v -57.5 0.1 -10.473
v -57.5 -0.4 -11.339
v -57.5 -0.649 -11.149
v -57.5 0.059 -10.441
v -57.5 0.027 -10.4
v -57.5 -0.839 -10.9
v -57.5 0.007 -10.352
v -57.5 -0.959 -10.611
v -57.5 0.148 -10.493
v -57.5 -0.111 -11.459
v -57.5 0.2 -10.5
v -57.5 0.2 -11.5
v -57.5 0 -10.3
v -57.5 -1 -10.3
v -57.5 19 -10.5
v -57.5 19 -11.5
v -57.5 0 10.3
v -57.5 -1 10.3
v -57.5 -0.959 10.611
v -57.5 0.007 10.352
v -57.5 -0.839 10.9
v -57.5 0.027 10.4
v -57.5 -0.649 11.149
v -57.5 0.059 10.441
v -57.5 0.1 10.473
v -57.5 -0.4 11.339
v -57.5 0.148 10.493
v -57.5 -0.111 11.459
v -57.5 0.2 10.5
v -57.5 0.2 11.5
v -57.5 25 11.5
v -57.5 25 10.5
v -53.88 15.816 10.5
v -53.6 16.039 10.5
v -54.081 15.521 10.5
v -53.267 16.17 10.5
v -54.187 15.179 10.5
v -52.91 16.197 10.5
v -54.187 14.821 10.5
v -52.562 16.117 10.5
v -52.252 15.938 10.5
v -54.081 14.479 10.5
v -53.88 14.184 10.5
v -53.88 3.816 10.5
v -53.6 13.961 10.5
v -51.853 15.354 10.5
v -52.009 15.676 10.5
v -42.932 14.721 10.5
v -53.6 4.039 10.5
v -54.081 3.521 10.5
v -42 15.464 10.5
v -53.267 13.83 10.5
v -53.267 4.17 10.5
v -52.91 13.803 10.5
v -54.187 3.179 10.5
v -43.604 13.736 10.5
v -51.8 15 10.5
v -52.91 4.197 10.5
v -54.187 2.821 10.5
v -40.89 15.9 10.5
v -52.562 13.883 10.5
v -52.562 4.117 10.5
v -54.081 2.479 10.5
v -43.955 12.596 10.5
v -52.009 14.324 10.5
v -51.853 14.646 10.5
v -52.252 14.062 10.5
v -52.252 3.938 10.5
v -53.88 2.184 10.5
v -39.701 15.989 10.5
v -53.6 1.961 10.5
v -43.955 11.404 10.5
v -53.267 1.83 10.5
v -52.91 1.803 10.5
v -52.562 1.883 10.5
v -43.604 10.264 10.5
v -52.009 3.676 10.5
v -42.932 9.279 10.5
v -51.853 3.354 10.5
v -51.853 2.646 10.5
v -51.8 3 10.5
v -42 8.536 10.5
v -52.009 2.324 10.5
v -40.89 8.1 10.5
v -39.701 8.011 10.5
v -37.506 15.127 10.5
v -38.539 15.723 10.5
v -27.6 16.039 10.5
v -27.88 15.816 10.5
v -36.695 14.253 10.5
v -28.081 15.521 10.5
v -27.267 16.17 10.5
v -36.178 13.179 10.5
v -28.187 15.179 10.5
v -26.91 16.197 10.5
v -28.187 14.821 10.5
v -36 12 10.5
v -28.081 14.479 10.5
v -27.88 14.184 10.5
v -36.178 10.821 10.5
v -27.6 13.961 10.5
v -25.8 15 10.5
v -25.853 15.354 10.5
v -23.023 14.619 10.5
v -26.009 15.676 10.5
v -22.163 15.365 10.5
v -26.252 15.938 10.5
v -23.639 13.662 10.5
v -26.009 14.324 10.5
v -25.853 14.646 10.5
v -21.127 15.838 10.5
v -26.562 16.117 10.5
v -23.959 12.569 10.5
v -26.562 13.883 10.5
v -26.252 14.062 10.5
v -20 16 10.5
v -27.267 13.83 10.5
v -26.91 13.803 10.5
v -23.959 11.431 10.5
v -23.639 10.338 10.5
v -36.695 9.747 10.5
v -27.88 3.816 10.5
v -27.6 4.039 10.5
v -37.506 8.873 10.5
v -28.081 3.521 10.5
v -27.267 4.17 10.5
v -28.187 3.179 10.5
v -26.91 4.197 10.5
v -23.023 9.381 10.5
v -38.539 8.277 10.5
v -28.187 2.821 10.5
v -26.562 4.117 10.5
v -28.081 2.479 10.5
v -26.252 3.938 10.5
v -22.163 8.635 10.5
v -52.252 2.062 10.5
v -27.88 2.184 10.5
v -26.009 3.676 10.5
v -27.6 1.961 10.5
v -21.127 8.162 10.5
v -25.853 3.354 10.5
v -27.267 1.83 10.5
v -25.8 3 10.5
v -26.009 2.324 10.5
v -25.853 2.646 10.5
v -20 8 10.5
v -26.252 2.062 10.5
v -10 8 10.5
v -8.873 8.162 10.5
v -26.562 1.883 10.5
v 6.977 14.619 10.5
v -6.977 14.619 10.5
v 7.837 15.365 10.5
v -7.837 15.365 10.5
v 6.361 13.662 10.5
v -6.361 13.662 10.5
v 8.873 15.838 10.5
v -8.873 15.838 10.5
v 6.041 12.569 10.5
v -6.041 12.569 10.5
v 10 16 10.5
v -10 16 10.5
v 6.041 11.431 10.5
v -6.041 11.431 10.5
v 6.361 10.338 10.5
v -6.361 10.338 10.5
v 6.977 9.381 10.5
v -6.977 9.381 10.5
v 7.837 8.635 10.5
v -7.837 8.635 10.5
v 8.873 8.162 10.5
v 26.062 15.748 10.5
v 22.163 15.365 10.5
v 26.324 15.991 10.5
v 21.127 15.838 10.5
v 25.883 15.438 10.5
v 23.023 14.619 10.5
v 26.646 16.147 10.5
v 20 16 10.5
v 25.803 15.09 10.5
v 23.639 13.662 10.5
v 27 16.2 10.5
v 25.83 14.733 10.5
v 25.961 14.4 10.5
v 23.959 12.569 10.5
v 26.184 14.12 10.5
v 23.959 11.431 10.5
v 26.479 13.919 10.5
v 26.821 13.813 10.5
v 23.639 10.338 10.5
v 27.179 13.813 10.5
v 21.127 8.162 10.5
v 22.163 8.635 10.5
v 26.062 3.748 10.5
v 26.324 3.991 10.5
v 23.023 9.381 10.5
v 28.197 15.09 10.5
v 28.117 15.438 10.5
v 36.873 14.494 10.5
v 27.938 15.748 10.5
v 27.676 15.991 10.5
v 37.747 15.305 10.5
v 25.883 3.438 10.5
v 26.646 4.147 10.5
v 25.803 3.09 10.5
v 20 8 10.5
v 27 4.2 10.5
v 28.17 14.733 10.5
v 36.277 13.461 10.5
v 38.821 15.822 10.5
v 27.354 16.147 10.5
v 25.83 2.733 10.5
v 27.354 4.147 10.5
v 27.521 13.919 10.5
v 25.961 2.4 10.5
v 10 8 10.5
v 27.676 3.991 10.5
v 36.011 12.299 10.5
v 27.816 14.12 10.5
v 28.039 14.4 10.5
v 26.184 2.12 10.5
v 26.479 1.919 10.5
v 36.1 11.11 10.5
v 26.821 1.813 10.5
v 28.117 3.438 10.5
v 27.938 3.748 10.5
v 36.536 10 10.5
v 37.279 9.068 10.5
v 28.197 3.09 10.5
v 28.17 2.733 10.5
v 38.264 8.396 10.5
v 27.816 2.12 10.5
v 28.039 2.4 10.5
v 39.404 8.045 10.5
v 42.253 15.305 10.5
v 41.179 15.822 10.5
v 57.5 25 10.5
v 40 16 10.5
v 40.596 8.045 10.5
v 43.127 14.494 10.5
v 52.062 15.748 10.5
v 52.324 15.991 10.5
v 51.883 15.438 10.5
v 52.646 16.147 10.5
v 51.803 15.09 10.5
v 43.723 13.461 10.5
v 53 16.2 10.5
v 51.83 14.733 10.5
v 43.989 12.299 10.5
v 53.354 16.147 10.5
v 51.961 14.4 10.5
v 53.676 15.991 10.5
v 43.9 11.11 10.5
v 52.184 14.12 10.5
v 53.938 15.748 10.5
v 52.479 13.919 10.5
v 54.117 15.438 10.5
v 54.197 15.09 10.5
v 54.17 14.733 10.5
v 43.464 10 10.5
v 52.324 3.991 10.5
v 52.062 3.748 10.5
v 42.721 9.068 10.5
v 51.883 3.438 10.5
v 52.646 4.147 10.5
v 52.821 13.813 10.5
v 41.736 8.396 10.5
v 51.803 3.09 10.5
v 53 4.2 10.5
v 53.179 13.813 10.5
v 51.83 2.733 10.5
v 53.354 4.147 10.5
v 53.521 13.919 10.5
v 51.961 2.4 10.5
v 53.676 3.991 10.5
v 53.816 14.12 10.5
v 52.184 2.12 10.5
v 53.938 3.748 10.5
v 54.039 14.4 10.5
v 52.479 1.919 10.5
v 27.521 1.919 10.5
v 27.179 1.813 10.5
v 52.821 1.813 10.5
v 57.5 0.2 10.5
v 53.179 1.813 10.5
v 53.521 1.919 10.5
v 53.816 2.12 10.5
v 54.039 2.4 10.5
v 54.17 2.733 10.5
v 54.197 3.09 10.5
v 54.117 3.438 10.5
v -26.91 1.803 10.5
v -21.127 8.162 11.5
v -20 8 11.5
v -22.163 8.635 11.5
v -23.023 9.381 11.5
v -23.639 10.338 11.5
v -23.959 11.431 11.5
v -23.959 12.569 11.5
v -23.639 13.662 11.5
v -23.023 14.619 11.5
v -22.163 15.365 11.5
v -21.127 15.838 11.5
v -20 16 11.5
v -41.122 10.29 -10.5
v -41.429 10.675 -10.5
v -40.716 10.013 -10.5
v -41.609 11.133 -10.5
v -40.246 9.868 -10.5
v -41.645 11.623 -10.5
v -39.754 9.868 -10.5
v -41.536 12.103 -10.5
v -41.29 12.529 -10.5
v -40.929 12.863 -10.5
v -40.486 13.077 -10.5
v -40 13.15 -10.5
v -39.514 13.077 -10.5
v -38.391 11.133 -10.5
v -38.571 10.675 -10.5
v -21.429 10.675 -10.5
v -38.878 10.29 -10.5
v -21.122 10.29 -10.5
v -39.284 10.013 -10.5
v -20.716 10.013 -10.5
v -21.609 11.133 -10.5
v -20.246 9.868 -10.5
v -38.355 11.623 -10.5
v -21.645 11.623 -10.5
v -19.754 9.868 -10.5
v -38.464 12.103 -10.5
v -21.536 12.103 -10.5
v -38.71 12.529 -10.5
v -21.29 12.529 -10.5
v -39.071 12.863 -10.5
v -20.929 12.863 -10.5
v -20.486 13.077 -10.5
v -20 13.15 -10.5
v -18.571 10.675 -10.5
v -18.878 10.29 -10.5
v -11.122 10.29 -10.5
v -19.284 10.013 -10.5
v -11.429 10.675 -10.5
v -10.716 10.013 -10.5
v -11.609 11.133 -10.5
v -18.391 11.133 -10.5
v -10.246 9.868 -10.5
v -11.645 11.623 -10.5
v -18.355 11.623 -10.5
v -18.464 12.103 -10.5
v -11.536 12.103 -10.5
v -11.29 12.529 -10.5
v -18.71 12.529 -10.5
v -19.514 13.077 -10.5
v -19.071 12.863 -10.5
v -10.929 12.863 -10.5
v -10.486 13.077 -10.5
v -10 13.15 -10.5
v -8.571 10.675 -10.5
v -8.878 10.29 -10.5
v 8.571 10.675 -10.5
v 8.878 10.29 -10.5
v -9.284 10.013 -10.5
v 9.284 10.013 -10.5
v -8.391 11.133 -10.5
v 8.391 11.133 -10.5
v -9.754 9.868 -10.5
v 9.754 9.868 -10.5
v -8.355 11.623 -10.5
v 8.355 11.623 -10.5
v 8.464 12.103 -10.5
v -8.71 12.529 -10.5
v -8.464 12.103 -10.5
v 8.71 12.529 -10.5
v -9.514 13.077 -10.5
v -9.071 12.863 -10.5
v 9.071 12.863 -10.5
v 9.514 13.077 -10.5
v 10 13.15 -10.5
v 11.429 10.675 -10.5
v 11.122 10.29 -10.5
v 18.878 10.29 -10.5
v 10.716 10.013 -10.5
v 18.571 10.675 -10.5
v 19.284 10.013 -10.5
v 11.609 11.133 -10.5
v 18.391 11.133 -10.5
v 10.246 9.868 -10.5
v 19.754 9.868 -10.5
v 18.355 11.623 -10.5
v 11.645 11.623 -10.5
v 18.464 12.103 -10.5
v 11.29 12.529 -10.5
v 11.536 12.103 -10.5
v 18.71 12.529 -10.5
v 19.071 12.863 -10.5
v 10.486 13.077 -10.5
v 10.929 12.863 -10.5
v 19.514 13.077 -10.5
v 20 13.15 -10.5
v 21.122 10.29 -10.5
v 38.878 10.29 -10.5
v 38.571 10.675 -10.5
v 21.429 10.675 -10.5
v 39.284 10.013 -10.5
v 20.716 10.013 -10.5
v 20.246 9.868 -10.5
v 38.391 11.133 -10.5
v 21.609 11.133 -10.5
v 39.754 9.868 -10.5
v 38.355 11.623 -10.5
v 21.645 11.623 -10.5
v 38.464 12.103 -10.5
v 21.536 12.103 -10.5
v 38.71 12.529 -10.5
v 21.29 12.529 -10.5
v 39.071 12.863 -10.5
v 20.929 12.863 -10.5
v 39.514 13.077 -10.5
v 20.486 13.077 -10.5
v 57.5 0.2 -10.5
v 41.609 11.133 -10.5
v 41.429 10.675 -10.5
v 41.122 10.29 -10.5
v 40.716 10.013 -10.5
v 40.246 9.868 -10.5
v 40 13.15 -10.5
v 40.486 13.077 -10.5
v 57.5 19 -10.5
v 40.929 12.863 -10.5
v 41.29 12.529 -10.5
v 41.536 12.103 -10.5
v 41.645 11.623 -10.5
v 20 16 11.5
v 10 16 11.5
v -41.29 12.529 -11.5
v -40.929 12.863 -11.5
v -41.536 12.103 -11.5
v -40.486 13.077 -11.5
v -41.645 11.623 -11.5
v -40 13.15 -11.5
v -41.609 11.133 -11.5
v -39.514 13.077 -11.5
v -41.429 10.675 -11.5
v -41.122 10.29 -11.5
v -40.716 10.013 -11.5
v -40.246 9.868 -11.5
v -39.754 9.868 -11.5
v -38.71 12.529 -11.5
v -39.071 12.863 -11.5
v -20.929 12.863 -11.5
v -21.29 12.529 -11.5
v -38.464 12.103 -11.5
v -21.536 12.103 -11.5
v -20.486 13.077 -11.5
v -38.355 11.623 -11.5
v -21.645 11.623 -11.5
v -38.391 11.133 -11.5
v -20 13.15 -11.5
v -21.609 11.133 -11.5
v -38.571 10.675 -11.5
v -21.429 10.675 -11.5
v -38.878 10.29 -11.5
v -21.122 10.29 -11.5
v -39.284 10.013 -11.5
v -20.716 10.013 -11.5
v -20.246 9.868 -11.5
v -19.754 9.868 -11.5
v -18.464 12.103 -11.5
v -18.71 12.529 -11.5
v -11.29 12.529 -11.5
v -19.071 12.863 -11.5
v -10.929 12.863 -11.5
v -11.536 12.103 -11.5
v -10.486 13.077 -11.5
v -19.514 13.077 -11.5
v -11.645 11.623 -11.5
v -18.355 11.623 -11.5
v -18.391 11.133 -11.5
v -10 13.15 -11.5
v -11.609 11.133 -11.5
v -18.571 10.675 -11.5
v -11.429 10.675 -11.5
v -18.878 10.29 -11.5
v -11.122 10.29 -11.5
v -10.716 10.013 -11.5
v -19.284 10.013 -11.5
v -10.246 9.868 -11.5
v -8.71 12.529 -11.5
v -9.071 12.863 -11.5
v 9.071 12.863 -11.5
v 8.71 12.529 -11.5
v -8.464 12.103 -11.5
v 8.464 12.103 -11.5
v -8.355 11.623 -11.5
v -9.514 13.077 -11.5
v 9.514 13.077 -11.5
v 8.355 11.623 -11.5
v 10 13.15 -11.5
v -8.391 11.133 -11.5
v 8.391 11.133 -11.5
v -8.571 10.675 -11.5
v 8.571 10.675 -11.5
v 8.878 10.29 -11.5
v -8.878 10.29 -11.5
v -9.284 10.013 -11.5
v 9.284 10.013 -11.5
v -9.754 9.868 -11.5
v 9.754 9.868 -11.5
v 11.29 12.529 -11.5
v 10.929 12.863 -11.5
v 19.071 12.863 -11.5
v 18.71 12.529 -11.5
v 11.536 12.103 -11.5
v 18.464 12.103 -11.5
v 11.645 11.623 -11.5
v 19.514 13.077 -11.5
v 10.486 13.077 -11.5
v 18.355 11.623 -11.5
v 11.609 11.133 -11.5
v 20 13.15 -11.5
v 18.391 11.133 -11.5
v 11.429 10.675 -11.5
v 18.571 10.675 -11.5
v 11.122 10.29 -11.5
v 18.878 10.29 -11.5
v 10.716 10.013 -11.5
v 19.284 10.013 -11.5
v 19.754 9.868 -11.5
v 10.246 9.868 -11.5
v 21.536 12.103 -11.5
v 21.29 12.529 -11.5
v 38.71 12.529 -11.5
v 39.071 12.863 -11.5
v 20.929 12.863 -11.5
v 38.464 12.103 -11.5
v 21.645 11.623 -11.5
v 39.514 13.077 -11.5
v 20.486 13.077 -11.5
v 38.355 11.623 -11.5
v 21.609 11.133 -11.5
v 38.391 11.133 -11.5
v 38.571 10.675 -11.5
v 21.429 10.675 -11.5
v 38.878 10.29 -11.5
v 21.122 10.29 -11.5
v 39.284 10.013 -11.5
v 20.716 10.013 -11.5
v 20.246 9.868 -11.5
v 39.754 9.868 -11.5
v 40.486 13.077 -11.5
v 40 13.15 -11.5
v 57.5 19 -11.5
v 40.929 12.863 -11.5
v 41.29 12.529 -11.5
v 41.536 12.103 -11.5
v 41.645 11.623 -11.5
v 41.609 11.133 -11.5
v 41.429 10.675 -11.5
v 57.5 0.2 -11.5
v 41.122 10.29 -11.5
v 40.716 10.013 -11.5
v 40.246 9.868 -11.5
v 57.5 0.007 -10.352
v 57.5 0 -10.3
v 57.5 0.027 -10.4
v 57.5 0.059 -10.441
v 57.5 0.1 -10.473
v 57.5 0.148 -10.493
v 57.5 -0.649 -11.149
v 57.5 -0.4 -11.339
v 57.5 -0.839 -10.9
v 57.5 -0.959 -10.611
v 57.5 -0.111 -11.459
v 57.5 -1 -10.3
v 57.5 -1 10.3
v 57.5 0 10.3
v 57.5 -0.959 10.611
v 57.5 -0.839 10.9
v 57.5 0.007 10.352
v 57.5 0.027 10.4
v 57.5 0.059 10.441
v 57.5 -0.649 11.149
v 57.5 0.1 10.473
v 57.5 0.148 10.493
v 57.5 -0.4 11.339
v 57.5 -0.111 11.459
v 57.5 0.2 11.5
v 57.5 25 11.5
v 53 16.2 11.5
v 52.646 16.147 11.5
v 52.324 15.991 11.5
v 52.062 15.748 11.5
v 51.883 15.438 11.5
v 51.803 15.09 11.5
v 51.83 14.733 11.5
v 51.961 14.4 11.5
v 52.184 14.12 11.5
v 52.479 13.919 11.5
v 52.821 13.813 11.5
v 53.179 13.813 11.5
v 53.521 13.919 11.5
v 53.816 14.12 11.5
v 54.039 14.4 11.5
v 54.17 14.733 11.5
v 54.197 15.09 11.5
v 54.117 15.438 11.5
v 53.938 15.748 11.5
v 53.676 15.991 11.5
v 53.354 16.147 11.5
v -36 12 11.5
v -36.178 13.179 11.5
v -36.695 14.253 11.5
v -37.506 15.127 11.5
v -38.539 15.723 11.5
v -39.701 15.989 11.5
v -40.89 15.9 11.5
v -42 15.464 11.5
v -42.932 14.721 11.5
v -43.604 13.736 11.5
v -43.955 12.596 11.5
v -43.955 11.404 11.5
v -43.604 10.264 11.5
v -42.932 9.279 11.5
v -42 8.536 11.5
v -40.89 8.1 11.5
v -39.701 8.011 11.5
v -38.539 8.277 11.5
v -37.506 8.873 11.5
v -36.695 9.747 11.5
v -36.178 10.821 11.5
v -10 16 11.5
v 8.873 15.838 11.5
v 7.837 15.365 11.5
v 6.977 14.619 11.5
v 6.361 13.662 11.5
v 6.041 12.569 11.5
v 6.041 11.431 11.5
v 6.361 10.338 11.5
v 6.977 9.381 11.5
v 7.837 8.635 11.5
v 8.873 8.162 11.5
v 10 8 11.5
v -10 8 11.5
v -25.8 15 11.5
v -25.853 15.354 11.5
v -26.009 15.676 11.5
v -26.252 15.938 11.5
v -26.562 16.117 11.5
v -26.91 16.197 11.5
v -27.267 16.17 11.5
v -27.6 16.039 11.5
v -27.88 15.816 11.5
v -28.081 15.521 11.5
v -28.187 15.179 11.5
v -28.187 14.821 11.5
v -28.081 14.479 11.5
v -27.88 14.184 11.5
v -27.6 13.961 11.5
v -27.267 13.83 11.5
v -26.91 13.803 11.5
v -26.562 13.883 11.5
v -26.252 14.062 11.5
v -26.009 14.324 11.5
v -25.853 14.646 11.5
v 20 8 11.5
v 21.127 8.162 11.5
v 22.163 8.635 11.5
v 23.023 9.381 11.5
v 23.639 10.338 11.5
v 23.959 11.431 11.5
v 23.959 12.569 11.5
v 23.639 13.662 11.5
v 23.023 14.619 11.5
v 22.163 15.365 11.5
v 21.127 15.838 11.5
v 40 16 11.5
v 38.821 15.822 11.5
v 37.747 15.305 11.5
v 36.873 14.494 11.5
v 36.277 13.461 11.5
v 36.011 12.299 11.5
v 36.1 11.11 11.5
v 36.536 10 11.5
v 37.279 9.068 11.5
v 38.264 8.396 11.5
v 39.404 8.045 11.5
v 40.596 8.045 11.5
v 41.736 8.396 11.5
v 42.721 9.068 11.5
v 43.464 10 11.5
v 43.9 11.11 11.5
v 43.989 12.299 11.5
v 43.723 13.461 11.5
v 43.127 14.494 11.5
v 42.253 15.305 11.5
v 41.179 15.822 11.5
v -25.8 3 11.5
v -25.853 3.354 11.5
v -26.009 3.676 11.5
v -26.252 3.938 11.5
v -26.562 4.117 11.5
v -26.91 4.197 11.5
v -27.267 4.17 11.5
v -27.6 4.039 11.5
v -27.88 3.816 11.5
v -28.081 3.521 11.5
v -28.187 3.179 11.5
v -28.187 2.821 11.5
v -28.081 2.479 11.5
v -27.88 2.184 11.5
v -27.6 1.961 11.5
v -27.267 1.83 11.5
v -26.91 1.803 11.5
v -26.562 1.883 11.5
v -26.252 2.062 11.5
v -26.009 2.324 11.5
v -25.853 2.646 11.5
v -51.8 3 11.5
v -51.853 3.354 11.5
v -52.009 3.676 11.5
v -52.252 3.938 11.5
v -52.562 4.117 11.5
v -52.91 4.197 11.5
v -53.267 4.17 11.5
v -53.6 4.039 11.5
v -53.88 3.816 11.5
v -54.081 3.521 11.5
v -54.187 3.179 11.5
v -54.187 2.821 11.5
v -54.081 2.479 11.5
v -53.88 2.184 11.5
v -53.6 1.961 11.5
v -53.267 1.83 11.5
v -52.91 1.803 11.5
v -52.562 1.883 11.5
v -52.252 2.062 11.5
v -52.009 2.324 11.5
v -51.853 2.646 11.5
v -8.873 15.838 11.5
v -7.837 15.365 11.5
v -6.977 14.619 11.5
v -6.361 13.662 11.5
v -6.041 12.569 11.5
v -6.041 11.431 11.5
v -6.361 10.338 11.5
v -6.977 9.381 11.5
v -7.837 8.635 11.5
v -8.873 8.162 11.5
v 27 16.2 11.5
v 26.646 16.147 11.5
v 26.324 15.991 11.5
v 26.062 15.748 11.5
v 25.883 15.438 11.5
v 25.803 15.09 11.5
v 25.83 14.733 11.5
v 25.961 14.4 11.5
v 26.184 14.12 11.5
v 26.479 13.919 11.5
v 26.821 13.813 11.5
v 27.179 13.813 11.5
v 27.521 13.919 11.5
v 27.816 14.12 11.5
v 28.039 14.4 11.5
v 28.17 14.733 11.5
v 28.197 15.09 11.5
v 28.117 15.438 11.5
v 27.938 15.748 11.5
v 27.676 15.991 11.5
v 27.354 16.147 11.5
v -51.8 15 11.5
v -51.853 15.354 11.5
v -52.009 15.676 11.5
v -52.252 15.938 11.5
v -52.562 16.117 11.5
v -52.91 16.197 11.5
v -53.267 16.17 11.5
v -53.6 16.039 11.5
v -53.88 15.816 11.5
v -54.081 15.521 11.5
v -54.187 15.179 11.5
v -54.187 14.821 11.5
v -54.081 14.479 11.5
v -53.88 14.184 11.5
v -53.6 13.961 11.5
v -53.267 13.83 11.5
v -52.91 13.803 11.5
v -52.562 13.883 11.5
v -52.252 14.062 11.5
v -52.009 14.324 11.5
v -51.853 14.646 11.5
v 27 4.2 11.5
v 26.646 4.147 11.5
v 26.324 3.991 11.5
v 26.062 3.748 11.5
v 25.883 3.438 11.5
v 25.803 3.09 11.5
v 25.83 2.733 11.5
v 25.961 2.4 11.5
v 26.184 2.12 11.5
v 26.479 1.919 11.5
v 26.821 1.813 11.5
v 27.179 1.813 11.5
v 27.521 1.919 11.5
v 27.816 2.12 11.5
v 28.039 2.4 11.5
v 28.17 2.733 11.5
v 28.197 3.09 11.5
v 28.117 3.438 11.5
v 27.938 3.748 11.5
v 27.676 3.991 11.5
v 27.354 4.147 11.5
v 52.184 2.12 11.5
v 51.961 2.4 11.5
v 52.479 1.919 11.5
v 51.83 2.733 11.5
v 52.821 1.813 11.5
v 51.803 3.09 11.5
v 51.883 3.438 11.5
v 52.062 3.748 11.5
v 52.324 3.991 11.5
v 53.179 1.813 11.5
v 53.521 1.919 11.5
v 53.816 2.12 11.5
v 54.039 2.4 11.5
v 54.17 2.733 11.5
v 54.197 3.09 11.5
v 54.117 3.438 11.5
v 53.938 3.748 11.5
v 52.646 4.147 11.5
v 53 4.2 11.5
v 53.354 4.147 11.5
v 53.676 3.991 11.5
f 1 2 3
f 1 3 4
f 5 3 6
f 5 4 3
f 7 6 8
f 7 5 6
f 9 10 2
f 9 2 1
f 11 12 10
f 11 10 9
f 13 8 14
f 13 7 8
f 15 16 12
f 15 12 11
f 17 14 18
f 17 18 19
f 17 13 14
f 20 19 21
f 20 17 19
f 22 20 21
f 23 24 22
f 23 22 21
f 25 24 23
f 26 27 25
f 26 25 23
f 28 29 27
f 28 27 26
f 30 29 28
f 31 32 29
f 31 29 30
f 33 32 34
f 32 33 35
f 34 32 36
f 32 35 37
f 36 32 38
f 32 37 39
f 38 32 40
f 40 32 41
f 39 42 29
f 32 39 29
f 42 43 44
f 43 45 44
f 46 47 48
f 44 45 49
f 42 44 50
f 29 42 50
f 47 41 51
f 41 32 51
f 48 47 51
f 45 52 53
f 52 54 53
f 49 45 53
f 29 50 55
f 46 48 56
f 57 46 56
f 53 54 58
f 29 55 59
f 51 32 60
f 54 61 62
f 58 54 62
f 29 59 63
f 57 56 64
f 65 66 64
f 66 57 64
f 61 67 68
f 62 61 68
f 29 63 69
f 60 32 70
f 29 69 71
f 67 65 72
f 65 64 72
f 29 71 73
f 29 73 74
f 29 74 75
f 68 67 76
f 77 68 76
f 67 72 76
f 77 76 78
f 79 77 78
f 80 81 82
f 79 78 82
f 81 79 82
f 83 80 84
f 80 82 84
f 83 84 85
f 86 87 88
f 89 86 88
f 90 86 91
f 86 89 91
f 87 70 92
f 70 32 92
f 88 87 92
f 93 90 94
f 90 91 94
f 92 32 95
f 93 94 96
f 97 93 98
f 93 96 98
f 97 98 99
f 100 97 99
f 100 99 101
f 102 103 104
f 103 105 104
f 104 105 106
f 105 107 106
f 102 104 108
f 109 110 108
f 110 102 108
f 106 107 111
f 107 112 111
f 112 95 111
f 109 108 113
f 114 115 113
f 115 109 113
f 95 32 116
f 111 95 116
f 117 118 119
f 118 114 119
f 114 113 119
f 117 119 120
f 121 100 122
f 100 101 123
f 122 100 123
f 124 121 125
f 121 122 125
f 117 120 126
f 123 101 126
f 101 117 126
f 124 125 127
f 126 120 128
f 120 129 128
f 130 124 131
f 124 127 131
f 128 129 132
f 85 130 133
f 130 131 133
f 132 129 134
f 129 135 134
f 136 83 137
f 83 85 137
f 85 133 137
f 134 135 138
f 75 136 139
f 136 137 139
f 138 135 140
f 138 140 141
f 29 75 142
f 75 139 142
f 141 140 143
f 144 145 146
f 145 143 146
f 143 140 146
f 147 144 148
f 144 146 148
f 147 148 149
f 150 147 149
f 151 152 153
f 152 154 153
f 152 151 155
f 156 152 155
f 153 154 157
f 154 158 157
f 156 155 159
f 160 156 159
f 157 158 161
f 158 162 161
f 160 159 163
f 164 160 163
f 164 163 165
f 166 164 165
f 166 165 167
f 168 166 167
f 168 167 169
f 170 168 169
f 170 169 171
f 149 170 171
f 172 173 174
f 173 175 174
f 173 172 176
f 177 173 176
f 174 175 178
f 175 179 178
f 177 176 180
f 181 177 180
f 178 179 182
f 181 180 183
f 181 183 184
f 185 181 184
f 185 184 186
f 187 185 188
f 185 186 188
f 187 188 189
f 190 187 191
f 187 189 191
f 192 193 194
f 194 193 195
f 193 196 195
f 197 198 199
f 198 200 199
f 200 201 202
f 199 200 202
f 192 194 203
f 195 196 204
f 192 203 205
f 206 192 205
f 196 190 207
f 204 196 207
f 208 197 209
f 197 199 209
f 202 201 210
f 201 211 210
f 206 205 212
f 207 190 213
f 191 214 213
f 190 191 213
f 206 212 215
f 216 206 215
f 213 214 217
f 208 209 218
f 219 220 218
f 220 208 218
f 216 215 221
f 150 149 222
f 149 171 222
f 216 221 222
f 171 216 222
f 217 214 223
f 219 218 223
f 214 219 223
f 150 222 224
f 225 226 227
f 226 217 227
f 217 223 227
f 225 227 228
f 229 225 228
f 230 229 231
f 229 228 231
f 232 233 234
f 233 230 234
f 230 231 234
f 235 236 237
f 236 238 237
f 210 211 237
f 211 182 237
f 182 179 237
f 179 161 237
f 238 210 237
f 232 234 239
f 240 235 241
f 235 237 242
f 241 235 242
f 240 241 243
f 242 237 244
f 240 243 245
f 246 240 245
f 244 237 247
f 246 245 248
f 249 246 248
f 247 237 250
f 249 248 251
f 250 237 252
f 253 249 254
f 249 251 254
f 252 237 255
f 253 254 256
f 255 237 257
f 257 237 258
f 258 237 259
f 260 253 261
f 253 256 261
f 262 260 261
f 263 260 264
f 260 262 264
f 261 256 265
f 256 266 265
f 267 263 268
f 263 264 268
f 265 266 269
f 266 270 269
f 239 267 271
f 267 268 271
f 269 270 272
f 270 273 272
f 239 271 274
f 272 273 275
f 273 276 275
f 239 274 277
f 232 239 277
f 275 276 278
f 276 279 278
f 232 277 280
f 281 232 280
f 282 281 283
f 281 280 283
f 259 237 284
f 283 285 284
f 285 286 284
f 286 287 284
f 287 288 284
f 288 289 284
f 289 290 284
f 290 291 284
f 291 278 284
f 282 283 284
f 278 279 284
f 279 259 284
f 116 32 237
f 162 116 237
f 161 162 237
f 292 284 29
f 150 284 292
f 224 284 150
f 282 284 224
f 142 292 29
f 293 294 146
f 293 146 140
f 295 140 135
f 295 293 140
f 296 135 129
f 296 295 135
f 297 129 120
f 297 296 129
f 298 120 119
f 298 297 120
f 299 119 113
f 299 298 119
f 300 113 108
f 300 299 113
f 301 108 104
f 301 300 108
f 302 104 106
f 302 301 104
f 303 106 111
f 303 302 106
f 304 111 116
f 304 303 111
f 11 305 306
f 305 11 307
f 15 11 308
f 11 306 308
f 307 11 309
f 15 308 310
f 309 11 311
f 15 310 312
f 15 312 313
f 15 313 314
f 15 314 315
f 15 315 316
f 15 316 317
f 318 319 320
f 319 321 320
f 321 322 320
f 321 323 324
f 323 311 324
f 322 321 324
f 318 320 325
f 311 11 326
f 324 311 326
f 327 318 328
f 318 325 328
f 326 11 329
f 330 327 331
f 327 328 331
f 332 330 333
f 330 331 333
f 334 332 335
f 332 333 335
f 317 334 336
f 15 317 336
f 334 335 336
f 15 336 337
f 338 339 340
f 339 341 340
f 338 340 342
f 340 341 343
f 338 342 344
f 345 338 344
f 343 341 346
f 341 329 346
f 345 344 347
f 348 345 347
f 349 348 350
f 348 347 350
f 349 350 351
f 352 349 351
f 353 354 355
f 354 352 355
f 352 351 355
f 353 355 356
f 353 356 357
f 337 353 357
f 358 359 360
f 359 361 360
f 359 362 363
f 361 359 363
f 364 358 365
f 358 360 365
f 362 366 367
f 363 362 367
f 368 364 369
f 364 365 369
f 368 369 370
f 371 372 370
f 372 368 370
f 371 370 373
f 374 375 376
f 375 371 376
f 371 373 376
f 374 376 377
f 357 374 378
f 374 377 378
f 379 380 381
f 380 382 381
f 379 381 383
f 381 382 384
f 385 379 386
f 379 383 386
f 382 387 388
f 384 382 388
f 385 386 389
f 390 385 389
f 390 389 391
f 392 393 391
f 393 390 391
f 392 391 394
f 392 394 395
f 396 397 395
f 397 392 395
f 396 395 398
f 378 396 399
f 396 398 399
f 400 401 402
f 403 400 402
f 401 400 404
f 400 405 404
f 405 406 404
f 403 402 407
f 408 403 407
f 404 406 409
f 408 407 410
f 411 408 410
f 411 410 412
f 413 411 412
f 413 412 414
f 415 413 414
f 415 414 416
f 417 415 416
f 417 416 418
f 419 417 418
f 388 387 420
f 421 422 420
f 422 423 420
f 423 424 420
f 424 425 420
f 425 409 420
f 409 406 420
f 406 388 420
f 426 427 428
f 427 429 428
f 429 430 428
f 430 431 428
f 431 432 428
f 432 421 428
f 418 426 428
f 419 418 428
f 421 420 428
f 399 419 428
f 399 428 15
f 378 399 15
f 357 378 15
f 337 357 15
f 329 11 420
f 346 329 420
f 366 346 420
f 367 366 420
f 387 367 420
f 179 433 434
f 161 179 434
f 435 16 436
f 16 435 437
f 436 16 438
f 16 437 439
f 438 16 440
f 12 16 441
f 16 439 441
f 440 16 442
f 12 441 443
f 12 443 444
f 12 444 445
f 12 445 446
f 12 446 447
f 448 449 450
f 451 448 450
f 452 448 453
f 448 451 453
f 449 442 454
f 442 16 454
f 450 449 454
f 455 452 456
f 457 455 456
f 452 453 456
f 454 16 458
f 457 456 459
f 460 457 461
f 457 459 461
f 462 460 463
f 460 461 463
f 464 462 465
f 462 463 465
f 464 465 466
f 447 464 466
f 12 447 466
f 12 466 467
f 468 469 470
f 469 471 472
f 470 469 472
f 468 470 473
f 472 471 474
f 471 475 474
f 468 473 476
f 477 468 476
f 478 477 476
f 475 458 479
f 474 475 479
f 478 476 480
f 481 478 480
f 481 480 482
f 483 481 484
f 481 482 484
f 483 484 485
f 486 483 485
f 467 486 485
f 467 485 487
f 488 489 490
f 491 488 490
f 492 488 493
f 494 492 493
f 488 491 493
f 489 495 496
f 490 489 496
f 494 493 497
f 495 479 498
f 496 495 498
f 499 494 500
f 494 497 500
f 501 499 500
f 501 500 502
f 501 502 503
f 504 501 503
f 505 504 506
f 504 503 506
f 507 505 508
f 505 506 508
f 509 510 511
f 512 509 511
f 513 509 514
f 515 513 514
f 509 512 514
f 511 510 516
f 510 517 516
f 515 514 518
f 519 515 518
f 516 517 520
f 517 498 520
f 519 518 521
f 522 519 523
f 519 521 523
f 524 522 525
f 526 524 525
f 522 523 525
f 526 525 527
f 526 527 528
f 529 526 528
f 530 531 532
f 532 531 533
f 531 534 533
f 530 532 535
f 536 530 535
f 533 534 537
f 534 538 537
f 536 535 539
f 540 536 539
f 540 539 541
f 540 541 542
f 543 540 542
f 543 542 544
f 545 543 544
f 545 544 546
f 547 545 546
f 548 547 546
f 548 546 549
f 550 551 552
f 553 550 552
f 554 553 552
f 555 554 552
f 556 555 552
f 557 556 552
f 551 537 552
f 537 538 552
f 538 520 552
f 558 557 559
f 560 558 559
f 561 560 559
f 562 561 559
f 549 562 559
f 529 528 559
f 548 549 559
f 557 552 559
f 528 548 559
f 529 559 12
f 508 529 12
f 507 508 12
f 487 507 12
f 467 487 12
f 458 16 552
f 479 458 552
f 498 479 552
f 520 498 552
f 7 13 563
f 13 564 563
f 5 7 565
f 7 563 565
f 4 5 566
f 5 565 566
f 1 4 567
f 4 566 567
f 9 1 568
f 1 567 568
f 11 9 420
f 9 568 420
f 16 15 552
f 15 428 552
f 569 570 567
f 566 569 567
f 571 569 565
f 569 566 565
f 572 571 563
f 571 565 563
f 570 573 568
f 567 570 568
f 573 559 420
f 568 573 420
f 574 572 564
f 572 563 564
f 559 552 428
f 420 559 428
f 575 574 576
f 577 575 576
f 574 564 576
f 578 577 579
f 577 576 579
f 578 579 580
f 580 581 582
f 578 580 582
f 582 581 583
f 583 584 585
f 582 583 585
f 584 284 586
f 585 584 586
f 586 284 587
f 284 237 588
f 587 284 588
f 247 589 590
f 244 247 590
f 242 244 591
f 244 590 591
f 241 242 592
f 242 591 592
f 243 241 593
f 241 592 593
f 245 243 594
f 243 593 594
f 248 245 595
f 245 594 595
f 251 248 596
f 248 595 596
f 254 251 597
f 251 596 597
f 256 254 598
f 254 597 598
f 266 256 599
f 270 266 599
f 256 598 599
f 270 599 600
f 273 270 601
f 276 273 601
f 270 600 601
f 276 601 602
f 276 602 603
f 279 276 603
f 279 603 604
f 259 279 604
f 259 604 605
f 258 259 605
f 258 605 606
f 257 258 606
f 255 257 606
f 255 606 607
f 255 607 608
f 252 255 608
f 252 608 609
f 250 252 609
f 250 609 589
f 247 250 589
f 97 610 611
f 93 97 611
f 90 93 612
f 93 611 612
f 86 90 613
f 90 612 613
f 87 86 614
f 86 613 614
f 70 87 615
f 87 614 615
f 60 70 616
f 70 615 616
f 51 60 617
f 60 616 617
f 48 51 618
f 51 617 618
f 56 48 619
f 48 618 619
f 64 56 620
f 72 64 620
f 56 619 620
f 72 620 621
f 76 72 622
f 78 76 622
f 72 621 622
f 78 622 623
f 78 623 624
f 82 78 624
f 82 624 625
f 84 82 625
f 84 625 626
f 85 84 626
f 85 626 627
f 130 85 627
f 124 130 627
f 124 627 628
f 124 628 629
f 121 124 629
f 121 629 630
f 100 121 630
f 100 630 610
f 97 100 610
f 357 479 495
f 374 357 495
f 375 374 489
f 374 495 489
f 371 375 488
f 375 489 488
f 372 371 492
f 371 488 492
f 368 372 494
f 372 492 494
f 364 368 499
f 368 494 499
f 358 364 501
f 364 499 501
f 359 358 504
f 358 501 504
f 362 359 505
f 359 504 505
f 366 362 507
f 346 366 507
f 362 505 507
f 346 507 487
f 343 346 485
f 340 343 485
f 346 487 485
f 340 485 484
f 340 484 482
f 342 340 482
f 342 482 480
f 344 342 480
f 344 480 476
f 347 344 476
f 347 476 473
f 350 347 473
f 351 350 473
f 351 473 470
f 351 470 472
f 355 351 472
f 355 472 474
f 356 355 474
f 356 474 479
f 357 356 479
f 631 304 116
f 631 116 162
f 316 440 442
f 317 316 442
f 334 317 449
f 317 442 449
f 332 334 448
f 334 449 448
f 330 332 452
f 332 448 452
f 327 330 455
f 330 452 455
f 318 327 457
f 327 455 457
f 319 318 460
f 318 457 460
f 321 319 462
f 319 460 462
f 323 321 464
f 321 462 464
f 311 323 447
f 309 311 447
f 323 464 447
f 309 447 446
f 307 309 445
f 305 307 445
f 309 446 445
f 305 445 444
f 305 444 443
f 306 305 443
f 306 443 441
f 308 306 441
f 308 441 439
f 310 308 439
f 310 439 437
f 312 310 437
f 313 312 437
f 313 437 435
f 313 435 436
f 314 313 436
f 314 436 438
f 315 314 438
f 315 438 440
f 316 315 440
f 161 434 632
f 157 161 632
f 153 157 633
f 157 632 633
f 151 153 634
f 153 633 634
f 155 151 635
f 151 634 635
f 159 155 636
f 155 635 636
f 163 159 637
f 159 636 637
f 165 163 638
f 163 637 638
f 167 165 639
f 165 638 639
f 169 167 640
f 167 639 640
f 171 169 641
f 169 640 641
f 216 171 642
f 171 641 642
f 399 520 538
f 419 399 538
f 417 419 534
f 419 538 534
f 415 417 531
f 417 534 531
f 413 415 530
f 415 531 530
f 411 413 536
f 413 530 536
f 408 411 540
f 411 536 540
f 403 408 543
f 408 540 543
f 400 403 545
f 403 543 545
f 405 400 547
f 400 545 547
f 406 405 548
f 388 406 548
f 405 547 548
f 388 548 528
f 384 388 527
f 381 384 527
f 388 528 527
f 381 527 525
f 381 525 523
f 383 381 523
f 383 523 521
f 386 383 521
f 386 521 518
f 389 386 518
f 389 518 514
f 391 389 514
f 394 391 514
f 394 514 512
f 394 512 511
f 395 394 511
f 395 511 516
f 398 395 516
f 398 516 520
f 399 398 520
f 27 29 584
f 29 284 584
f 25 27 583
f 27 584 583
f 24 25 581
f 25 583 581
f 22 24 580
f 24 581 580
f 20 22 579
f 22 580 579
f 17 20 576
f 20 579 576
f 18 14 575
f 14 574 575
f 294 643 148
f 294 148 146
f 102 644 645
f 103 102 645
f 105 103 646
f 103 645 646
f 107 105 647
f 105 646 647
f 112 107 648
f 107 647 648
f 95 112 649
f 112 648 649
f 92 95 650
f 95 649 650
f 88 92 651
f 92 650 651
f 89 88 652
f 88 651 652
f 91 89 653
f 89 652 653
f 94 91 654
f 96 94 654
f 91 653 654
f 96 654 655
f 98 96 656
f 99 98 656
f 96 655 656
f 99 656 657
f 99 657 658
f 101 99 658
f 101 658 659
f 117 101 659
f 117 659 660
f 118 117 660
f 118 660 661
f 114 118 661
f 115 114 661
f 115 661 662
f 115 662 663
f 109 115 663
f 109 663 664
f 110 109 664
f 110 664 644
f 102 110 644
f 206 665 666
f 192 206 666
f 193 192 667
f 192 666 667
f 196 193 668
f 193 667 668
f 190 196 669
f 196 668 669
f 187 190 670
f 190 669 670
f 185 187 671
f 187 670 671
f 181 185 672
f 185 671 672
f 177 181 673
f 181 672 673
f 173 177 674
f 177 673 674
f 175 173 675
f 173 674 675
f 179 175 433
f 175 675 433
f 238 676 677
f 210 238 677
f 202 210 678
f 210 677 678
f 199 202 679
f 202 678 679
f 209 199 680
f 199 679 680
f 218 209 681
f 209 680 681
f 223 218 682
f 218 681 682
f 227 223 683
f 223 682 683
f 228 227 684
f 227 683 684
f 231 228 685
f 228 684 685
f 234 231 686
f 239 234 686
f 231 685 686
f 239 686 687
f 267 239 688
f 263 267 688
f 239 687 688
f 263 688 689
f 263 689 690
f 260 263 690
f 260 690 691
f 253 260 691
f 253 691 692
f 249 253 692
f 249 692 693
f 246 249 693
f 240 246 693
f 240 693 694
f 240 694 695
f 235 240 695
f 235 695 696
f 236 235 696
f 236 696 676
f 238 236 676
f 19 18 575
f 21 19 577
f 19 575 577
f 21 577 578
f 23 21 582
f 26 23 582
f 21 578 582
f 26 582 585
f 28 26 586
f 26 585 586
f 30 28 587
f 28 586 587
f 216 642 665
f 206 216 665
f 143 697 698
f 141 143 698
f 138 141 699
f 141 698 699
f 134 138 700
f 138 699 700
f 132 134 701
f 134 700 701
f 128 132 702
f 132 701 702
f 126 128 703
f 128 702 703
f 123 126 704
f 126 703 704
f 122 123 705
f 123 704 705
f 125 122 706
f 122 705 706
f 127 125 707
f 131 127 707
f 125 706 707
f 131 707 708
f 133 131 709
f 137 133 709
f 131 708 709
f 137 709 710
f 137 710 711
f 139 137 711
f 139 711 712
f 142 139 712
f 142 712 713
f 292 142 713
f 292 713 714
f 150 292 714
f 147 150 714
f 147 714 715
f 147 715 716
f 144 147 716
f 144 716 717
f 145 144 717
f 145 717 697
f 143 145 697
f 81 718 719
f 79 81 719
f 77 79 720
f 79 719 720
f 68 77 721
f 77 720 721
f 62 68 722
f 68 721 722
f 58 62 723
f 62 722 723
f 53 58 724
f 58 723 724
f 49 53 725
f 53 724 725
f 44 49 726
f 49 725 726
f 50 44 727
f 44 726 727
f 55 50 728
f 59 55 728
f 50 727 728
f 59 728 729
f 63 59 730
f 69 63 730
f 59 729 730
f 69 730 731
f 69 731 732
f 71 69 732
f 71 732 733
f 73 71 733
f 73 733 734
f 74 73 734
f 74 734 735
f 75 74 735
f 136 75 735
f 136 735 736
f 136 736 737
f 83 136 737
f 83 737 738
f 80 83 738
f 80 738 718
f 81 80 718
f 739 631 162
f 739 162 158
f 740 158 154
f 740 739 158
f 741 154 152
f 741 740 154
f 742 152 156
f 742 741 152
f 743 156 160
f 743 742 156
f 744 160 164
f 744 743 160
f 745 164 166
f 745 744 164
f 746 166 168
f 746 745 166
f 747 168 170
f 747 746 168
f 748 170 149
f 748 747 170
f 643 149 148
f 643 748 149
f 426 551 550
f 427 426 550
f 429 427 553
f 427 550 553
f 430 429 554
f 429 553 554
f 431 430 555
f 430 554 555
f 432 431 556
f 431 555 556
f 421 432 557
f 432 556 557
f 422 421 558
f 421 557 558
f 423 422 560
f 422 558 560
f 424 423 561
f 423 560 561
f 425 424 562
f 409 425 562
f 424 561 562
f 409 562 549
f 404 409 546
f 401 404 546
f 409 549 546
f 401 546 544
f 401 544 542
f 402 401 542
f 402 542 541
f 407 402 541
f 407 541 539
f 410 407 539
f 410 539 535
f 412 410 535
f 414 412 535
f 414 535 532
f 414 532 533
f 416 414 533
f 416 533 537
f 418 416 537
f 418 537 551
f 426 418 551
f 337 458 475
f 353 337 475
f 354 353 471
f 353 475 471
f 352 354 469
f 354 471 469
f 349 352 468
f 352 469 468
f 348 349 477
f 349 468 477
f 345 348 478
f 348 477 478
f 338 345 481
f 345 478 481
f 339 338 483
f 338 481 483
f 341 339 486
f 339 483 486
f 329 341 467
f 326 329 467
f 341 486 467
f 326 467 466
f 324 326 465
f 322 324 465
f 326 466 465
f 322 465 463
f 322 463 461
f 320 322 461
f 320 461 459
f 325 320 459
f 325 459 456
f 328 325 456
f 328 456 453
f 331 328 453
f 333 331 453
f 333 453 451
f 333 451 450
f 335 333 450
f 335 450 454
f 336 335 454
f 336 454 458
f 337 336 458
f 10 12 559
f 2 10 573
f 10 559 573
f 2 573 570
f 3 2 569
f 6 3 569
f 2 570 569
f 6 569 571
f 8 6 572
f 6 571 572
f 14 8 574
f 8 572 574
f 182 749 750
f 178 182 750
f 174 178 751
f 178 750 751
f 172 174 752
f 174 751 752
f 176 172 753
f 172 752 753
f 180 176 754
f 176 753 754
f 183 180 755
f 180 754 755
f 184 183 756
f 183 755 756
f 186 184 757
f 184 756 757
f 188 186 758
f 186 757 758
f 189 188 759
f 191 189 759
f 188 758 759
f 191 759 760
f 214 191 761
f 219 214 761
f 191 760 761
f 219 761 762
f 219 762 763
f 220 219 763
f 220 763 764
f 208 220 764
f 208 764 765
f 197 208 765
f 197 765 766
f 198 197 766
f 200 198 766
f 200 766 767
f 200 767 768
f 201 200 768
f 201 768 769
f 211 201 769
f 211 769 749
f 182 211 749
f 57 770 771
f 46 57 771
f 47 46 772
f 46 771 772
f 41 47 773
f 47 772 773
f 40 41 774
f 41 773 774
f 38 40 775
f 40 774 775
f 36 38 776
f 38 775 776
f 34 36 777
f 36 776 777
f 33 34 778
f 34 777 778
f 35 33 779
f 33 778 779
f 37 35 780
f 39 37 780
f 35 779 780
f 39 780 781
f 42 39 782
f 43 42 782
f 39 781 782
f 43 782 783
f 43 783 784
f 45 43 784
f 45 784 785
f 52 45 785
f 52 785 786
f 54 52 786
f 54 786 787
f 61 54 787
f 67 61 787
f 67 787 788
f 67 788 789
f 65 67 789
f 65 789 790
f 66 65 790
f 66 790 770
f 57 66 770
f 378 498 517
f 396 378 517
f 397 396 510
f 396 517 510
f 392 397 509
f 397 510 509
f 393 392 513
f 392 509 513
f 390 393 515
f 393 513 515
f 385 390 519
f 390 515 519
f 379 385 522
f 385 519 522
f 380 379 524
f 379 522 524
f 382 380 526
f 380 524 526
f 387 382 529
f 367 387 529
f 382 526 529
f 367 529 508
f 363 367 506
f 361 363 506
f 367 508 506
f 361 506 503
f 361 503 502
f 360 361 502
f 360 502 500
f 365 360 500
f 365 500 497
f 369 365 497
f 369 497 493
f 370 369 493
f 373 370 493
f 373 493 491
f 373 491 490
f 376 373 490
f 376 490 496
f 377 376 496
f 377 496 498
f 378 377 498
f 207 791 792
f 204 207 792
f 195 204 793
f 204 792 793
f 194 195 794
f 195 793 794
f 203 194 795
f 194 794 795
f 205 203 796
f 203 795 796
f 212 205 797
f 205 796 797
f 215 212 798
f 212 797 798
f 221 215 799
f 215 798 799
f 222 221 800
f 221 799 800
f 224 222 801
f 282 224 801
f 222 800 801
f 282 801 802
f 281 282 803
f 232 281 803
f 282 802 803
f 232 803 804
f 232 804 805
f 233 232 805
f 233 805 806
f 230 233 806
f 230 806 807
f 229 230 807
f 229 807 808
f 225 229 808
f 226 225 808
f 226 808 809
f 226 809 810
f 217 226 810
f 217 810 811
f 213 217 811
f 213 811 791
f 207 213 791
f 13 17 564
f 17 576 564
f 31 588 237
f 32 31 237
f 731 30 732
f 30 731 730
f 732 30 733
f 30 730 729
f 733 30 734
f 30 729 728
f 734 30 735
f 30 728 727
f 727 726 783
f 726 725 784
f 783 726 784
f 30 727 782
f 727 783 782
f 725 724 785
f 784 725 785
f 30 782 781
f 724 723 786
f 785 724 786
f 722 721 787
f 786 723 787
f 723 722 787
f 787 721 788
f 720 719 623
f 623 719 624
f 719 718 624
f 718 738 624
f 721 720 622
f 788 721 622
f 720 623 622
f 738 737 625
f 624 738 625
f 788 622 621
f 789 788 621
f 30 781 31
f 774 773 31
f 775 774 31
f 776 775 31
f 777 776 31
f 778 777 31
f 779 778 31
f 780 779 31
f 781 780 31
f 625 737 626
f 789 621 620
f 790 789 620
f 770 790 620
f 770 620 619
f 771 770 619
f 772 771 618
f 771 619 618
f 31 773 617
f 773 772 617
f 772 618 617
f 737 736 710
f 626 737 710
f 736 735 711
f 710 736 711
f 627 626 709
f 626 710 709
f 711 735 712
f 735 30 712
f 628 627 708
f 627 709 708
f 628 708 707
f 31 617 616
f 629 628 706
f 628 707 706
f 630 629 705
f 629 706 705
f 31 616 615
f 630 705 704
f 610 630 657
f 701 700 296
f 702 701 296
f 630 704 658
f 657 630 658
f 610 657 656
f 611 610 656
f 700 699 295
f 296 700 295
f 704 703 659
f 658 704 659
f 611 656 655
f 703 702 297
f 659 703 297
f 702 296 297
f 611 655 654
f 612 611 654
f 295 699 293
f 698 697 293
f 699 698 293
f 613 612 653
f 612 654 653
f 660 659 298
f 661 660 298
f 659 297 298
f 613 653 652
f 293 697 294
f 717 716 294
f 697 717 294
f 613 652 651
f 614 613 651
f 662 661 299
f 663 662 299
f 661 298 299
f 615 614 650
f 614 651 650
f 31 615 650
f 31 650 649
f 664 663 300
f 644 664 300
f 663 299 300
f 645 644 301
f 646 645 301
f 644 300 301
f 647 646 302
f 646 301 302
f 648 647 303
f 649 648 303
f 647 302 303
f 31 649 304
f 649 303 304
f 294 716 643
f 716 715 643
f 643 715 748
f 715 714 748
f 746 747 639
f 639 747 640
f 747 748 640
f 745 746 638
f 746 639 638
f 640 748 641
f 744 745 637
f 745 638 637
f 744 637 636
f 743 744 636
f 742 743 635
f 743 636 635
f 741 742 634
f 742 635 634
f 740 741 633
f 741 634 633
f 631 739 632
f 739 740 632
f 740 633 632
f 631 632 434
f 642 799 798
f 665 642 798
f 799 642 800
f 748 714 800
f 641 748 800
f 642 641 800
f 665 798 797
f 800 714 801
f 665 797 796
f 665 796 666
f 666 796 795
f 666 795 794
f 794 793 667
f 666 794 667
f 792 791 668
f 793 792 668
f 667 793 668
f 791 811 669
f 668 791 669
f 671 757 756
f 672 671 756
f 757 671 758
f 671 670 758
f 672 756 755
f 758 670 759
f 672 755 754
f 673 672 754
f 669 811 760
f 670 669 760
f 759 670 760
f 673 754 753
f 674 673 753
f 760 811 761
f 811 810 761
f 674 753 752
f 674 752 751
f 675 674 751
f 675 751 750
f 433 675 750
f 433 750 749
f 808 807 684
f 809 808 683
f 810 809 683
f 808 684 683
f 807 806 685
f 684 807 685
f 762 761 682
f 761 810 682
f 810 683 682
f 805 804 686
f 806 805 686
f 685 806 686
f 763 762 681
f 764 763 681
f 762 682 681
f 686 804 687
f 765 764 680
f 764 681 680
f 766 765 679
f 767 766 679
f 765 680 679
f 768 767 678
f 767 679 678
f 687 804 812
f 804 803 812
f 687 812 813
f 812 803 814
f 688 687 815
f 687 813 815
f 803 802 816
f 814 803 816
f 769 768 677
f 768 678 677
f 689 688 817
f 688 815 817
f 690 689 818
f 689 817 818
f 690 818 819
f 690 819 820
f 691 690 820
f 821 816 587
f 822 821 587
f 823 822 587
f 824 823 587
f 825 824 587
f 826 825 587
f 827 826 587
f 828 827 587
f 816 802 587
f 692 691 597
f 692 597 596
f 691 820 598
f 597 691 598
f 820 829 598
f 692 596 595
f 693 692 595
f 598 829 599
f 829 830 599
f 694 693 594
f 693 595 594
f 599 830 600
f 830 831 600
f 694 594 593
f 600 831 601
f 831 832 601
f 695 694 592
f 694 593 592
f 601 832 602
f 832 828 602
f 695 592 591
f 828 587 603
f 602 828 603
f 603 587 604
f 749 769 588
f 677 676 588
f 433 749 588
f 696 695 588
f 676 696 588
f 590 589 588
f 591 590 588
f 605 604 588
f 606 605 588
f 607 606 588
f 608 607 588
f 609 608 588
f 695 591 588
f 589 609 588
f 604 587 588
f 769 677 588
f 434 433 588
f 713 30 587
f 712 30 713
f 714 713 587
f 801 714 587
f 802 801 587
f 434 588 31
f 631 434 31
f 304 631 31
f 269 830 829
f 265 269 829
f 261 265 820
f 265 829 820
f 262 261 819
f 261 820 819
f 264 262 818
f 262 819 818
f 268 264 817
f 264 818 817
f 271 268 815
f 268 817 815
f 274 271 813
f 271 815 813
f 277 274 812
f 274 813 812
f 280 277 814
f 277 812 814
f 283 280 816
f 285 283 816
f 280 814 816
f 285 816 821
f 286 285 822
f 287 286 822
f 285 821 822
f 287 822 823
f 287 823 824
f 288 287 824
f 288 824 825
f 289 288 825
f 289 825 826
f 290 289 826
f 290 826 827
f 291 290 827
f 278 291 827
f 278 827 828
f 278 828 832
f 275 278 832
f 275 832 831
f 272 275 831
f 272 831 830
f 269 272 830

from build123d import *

# Parameters (mm, degrees)
BASIS_BLECH1_DEPTH              = 57.5
SCHNITT_LINEAR_AUSTRAGEN1_REACH = 68.785
SKIZZE6_R                       = 4
SKIZZE6_R_2                     = 1.2
SCHNITT_LINEAR_AUSTRAGEN2_REACH = 68.785
SKIZZE7_R                       = 1.65


# Sheet-metal steps are written as plain solids
with BuildPart() as part:
    # Skizze1 → Basis-Blech1 (new, symmetric)
    with BuildSketch(Plane(origin=(0, 0, 0), x_dir=(0, 0, -1), z_dir=(1, 0, 0))):
        with BuildLine():
            Line((-10.5, 25), (-10.5, 0.2))
            ThreePointArc((-10.5, 0.2), (-10.441421356, 0.058578644), (-10.3, 0))
            Line((-10.3, 0), (10.3, 0))
            ThreePointArc((10.3, 0), (10.441421356, 0.058578644), (10.5, 0.2))
            Line((10.5, 0.2), (10.5, 19))
            Line((10.5, 19), (11.5, 19))
            Line((11.5, 19), (11.5, 0.2))
            ThreePointArc((11.5, 0.2), (11.148528137, -0.648528137), (10.3, -1))
            Line((10.3, -1), (-10.3, -1))
            ThreePointArc((-10.3, -1), (-11.148528137, -0.648528137), (-11.5, 0.2))
            Line((-11.5, 0.2), (-11.5, 25))
            Line((-11.5, 25), (-10.5, 25))
        make_face()
    extrude(amount=BASIS_BLECH1_DEPTH, both=True)

    # Skizze6 → Schnitt-Linear austragen1 (cut, up to next)
    with BuildSketch(Plane.XY.offset(11.5), mode=Mode.PRIVATE) as schnitt_linear_austragen1_sk1:
        with Locations((-40, 12)):
            Circle(SKIZZE6_R)
    schnitt_linear_austragen1_tool1 = extrude(schnitt_linear_austragen1_sk1.sketch, amount=-SCHNITT_LINEAR_AUSTRAGEN1_REACH, mode=Mode.PRIVATE) & part.part
    # Skizze6 → Schnitt-Linear austragen1 (cut, up to next)
    with BuildSketch(Plane.XY.offset(11.5), mode=Mode.PRIVATE) as schnitt_linear_austragen1_sk2:
        with Locations((-53, 15)):
            Circle(SKIZZE6_R_2)
    schnitt_linear_austragen1_tool2 = extrude(schnitt_linear_austragen1_sk2.sketch, amount=-SCHNITT_LINEAR_AUSTRAGEN1_REACH, mode=Mode.PRIVATE) & part.part
    # Skizze6 → Schnitt-Linear austragen1 (cut, up to next)
    with BuildSketch(Plane.XY.offset(11.5), mode=Mode.PRIVATE) as schnitt_linear_austragen1_sk3:
        with Locations((-53, 3)):
            Circle(SKIZZE6_R_2)
    schnitt_linear_austragen1_tool3 = extrude(schnitt_linear_austragen1_sk3.sketch, amount=-SCHNITT_LINEAR_AUSTRAGEN1_REACH, mode=Mode.PRIVATE) & part.part
    # Skizze6 → Schnitt-Linear austragen1 (cut, up to next)
    with BuildSketch(Plane.XY.offset(11.5), mode=Mode.PRIVATE) as schnitt_linear_austragen1_sk4:
        with Locations((-27, 15)):
            Circle(SKIZZE6_R_2)
    schnitt_linear_austragen1_tool4 = extrude(schnitt_linear_austragen1_sk4.sketch, amount=-SCHNITT_LINEAR_AUSTRAGEN1_REACH, mode=Mode.PRIVATE) & part.part
    # Skizze6 → Schnitt-Linear austragen1 (cut, up to next)
    with BuildSketch(Plane.XY.offset(11.5), mode=Mode.PRIVATE) as schnitt_linear_austragen1_sk5:
        with Locations((-27, 3)):
            Circle(SKIZZE6_R_2)
    schnitt_linear_austragen1_tool5 = extrude(schnitt_linear_austragen1_sk5.sketch, amount=-SCHNITT_LINEAR_AUSTRAGEN1_REACH, mode=Mode.PRIVATE) & part.part
    # Skizze6 → Schnitt-Linear austragen1 (cut, up to next)
    with BuildSketch(Plane.XY.offset(11.5), mode=Mode.PRIVATE) as schnitt_linear_austragen1_sk6:
        with Locations(Location((53, 3, 0), (0, 0, 90))):
            Circle(SKIZZE6_R_2)
    schnitt_linear_austragen1_tool6 = extrude(schnitt_linear_austragen1_sk6.sketch, amount=-SCHNITT_LINEAR_AUSTRAGEN1_REACH, mode=Mode.PRIVATE) & part.part
    # Skizze6 → Schnitt-Linear austragen1 (cut, up to next)
    with BuildSketch(Plane.XY.offset(11.5), mode=Mode.PRIVATE) as schnitt_linear_austragen1_sk7:
        with Locations(Location((27, 3, 0), (0, 0, 90))):
            Circle(SKIZZE6_R_2)
    schnitt_linear_austragen1_tool7 = extrude(schnitt_linear_austragen1_sk7.sketch, amount=-SCHNITT_LINEAR_AUSTRAGEN1_REACH, mode=Mode.PRIVATE) & part.part
    # Skizze6 → Schnitt-Linear austragen1 (cut, up to next)
    with BuildSketch(Plane.XY.offset(11.5), mode=Mode.PRIVATE) as schnitt_linear_austragen1_sk8:
        with Locations(Location((27, 15, 0), (0, 0, 90))):
            Circle(SKIZZE6_R_2)
    schnitt_linear_austragen1_tool8 = extrude(schnitt_linear_austragen1_sk8.sketch, amount=-SCHNITT_LINEAR_AUSTRAGEN1_REACH, mode=Mode.PRIVATE) & part.part
    # Skizze6 → Schnitt-Linear austragen1 (cut, up to next)
    with BuildSketch(Plane.XY.offset(11.5), mode=Mode.PRIVATE) as schnitt_linear_austragen1_sk9:
        with Locations(Location((40, 12, 0), (0, 0, 90))):
            Circle(SKIZZE6_R)
    schnitt_linear_austragen1_tool9 = extrude(schnitt_linear_austragen1_sk9.sketch, amount=-SCHNITT_LINEAR_AUSTRAGEN1_REACH, mode=Mode.PRIVATE) & part.part
    # Skizze6 → Schnitt-Linear austragen1 (cut, up to next)
    with BuildSketch(Plane.XY.offset(11.5), mode=Mode.PRIVATE) as schnitt_linear_austragen1_sk10:
        with Locations(Location((53, 15, 0), (0, 0, 90))):
            Circle(SKIZZE6_R_2)
    schnitt_linear_austragen1_tool10 = extrude(schnitt_linear_austragen1_sk10.sketch, amount=-SCHNITT_LINEAR_AUSTRAGEN1_REACH, mode=Mode.PRIVATE) & part.part
    # Skizze6 → Schnitt-Linear austragen1 (cut, up to next)
    with BuildSketch(Plane.XY.offset(11.5), mode=Mode.PRIVATE) as schnitt_linear_austragen1_sk11:
        with BuildLine():
            Line((-20, 16), (-10, 16))
            ThreePointArc((-10, 16), (-6, 12), (-10, 8))
            Line((-10, 8), (-20, 8))
            ThreePointArc((-20, 8), (-24, 12), (-20, 16))
        make_face()
    schnitt_linear_austragen1_tool11 = extrude(schnitt_linear_austragen1_sk11.sketch, amount=-SCHNITT_LINEAR_AUSTRAGEN1_REACH, mode=Mode.PRIVATE) & part.part
    # Skizze6 → Schnitt-Linear austragen1 (cut, up to next)
    with BuildSketch(Plane.XY.offset(11.5), mode=Mode.PRIVATE) as schnitt_linear_austragen1_sk12:
        with BuildLine():
            Line((20, 16), (10, 16))
            ThreePointArc((10, 16), (6, 12), (10, 8))
            Line((10, 8), (20, 8))
            ThreePointArc((20, 8), (24, 12), (20, 16))
        make_face()
    schnitt_linear_austragen1_tool12 = extrude(schnitt_linear_austragen1_sk12.sketch, amount=-SCHNITT_LINEAR_AUSTRAGEN1_REACH, mode=Mode.PRIVATE) & part.part
    add(schnitt_linear_austragen1_tool1.solids().sort_by_distance((-40, 12, 11.5))[0], mode=Mode.SUBTRACT)
    add(schnitt_linear_austragen1_tool2.solids().sort_by_distance((-53, 15, 11.5))[0], mode=Mode.SUBTRACT)
    add(schnitt_linear_austragen1_tool3.solids().sort_by_distance((-53, 3, 11.5))[0], mode=Mode.SUBTRACT)
    add(schnitt_linear_austragen1_tool4.solids().sort_by_distance((-27, 15, 11.5))[0], mode=Mode.SUBTRACT)
    add(schnitt_linear_austragen1_tool5.solids().sort_by_distance((-27, 3, 11.5))[0], mode=Mode.SUBTRACT)
    add(schnitt_linear_austragen1_tool6.solids().sort_by_distance((53, 3, 11.5))[0], mode=Mode.SUBTRACT)
    add(schnitt_linear_austragen1_tool7.solids().sort_by_distance((27, 3, 11.5))[0], mode=Mode.SUBTRACT)
    add(schnitt_linear_austragen1_tool8.solids().sort_by_distance((27, 15, 11.5))[0], mode=Mode.SUBTRACT)
    add(schnitt_linear_austragen1_tool9.solids().sort_by_distance((40, 12, 11.5))[0], mode=Mode.SUBTRACT)
    add(schnitt_linear_austragen1_tool10.solids().sort_by_distance((53, 15, 11.5))[0], mode=Mode.SUBTRACT)
    add(schnitt_linear_austragen1_tool11.solids().sort_by_distance((-15, 12, 11.5))[0], mode=Mode.SUBTRACT)
    add(schnitt_linear_austragen1_tool12.solids().sort_by_distance((15, 12, 11.5))[0], mode=Mode.SUBTRACT)

    # Skizze7 → Schnitt-Linear austragen2 (cut, up to next)
    with BuildSketch(Plane(origin=(0, 0, -11.5), x_dir=(-1, 0, 0), z_dir=(0, 0, -1)), mode=Mode.PRIVATE) as schnitt_linear_austragen2_sk1:
        with Locations(Location((-40, 11.5, 0), (0, 0, 90))):
            Circle(SKIZZE7_R)
    schnitt_linear_austragen2_tool1 = extrude(schnitt_linear_austragen2_sk1.sketch, amount=-SCHNITT_LINEAR_AUSTRAGEN2_REACH, mode=Mode.PRIVATE) & part.part
    # Skizze7 → Schnitt-Linear austragen2 (cut, up to next)
    with BuildSketch(Plane(origin=(0, 0, -11.5), x_dir=(-1, 0, 0), z_dir=(0, 0, -1)), mode=Mode.PRIVATE) as schnitt_linear_austragen2_sk2:
        with Locations(Location((-20, 11.5, 0), (0, 0, 90))):
            Circle(SKIZZE7_R)
    schnitt_linear_austragen2_tool2 = extrude(schnitt_linear_austragen2_sk2.sketch, amount=-SCHNITT_LINEAR_AUSTRAGEN2_REACH, mode=Mode.PRIVATE) & part.part
    # Skizze7 → Schnitt-Linear austragen2 (cut, up to next)
    with BuildSketch(Plane(origin=(0, 0, -11.5), x_dir=(-1, 0, 0), z_dir=(0, 0, -1)), mode=Mode.PRIVATE) as schnitt_linear_austragen2_sk3:
        with Locations(Location((-10, 11.5, 0), (0, 0, 90))):
            Circle(SKIZZE7_R)
    schnitt_linear_austragen2_tool3 = extrude(schnitt_linear_austragen2_sk3.sketch, amount=-SCHNITT_LINEAR_AUSTRAGEN2_REACH, mode=Mode.PRIVATE) & part.part
    # Skizze7 → Schnitt-Linear austragen2 (cut, up to next)
    with BuildSketch(Plane(origin=(0, 0, -11.5), x_dir=(-1, 0, 0), z_dir=(0, 0, -1)), mode=Mode.PRIVATE) as schnitt_linear_austragen2_sk4:
        with Locations(Location((10, 11.5, 0), (0, 0, 90))):
            Circle(SKIZZE7_R)
    schnitt_linear_austragen2_tool4 = extrude(schnitt_linear_austragen2_sk4.sketch, amount=-SCHNITT_LINEAR_AUSTRAGEN2_REACH, mode=Mode.PRIVATE) & part.part
    # Skizze7 → Schnitt-Linear austragen2 (cut, up to next)
    with BuildSketch(Plane(origin=(0, 0, -11.5), x_dir=(-1, 0, 0), z_dir=(0, 0, -1)), mode=Mode.PRIVATE) as schnitt_linear_austragen2_sk5:
        with Locations(Location((20, 11.5, 0), (0, 0, 90))):
            Circle(SKIZZE7_R)
    schnitt_linear_austragen2_tool5 = extrude(schnitt_linear_austragen2_sk5.sketch, amount=-SCHNITT_LINEAR_AUSTRAGEN2_REACH, mode=Mode.PRIVATE) & part.part
    # Skizze7 → Schnitt-Linear austragen2 (cut, up to next)
    with BuildSketch(Plane(origin=(0, 0, -11.5), x_dir=(-1, 0, 0), z_dir=(0, 0, -1)), mode=Mode.PRIVATE) as schnitt_linear_austragen2_sk6:
        with Locations(Location((40, 11.5, 0), (0, 0, 90))):
            Circle(SKIZZE7_R)
    schnitt_linear_austragen2_tool6 = extrude(schnitt_linear_austragen2_sk6.sketch, amount=-SCHNITT_LINEAR_AUSTRAGEN2_REACH, mode=Mode.PRIVATE) & part.part
    add(schnitt_linear_austragen2_tool1.solids().sort_by_distance((40, 11.5, -11.5))[0], mode=Mode.SUBTRACT)
    add(schnitt_linear_austragen2_tool2.solids().sort_by_distance((20, 11.5, -11.5))[0], mode=Mode.SUBTRACT)
    add(schnitt_linear_austragen2_tool3.solids().sort_by_distance((10, 11.5, -11.5))[0], mode=Mode.SUBTRACT)
    add(schnitt_linear_austragen2_tool4.solids().sort_by_distance((-10, 11.5, -11.5))[0], mode=Mode.SUBTRACT)
    add(schnitt_linear_austragen2_tool5.solids().sort_by_distance((-20, 11.5, -11.5))[0], mode=Mode.SUBTRACT)
    add(schnitt_linear_austragen2_tool6.solids().sort_by_distance((-40, 11.5, -11.5))[0], mode=Mode.SUBTRACT)


solid = part.part
